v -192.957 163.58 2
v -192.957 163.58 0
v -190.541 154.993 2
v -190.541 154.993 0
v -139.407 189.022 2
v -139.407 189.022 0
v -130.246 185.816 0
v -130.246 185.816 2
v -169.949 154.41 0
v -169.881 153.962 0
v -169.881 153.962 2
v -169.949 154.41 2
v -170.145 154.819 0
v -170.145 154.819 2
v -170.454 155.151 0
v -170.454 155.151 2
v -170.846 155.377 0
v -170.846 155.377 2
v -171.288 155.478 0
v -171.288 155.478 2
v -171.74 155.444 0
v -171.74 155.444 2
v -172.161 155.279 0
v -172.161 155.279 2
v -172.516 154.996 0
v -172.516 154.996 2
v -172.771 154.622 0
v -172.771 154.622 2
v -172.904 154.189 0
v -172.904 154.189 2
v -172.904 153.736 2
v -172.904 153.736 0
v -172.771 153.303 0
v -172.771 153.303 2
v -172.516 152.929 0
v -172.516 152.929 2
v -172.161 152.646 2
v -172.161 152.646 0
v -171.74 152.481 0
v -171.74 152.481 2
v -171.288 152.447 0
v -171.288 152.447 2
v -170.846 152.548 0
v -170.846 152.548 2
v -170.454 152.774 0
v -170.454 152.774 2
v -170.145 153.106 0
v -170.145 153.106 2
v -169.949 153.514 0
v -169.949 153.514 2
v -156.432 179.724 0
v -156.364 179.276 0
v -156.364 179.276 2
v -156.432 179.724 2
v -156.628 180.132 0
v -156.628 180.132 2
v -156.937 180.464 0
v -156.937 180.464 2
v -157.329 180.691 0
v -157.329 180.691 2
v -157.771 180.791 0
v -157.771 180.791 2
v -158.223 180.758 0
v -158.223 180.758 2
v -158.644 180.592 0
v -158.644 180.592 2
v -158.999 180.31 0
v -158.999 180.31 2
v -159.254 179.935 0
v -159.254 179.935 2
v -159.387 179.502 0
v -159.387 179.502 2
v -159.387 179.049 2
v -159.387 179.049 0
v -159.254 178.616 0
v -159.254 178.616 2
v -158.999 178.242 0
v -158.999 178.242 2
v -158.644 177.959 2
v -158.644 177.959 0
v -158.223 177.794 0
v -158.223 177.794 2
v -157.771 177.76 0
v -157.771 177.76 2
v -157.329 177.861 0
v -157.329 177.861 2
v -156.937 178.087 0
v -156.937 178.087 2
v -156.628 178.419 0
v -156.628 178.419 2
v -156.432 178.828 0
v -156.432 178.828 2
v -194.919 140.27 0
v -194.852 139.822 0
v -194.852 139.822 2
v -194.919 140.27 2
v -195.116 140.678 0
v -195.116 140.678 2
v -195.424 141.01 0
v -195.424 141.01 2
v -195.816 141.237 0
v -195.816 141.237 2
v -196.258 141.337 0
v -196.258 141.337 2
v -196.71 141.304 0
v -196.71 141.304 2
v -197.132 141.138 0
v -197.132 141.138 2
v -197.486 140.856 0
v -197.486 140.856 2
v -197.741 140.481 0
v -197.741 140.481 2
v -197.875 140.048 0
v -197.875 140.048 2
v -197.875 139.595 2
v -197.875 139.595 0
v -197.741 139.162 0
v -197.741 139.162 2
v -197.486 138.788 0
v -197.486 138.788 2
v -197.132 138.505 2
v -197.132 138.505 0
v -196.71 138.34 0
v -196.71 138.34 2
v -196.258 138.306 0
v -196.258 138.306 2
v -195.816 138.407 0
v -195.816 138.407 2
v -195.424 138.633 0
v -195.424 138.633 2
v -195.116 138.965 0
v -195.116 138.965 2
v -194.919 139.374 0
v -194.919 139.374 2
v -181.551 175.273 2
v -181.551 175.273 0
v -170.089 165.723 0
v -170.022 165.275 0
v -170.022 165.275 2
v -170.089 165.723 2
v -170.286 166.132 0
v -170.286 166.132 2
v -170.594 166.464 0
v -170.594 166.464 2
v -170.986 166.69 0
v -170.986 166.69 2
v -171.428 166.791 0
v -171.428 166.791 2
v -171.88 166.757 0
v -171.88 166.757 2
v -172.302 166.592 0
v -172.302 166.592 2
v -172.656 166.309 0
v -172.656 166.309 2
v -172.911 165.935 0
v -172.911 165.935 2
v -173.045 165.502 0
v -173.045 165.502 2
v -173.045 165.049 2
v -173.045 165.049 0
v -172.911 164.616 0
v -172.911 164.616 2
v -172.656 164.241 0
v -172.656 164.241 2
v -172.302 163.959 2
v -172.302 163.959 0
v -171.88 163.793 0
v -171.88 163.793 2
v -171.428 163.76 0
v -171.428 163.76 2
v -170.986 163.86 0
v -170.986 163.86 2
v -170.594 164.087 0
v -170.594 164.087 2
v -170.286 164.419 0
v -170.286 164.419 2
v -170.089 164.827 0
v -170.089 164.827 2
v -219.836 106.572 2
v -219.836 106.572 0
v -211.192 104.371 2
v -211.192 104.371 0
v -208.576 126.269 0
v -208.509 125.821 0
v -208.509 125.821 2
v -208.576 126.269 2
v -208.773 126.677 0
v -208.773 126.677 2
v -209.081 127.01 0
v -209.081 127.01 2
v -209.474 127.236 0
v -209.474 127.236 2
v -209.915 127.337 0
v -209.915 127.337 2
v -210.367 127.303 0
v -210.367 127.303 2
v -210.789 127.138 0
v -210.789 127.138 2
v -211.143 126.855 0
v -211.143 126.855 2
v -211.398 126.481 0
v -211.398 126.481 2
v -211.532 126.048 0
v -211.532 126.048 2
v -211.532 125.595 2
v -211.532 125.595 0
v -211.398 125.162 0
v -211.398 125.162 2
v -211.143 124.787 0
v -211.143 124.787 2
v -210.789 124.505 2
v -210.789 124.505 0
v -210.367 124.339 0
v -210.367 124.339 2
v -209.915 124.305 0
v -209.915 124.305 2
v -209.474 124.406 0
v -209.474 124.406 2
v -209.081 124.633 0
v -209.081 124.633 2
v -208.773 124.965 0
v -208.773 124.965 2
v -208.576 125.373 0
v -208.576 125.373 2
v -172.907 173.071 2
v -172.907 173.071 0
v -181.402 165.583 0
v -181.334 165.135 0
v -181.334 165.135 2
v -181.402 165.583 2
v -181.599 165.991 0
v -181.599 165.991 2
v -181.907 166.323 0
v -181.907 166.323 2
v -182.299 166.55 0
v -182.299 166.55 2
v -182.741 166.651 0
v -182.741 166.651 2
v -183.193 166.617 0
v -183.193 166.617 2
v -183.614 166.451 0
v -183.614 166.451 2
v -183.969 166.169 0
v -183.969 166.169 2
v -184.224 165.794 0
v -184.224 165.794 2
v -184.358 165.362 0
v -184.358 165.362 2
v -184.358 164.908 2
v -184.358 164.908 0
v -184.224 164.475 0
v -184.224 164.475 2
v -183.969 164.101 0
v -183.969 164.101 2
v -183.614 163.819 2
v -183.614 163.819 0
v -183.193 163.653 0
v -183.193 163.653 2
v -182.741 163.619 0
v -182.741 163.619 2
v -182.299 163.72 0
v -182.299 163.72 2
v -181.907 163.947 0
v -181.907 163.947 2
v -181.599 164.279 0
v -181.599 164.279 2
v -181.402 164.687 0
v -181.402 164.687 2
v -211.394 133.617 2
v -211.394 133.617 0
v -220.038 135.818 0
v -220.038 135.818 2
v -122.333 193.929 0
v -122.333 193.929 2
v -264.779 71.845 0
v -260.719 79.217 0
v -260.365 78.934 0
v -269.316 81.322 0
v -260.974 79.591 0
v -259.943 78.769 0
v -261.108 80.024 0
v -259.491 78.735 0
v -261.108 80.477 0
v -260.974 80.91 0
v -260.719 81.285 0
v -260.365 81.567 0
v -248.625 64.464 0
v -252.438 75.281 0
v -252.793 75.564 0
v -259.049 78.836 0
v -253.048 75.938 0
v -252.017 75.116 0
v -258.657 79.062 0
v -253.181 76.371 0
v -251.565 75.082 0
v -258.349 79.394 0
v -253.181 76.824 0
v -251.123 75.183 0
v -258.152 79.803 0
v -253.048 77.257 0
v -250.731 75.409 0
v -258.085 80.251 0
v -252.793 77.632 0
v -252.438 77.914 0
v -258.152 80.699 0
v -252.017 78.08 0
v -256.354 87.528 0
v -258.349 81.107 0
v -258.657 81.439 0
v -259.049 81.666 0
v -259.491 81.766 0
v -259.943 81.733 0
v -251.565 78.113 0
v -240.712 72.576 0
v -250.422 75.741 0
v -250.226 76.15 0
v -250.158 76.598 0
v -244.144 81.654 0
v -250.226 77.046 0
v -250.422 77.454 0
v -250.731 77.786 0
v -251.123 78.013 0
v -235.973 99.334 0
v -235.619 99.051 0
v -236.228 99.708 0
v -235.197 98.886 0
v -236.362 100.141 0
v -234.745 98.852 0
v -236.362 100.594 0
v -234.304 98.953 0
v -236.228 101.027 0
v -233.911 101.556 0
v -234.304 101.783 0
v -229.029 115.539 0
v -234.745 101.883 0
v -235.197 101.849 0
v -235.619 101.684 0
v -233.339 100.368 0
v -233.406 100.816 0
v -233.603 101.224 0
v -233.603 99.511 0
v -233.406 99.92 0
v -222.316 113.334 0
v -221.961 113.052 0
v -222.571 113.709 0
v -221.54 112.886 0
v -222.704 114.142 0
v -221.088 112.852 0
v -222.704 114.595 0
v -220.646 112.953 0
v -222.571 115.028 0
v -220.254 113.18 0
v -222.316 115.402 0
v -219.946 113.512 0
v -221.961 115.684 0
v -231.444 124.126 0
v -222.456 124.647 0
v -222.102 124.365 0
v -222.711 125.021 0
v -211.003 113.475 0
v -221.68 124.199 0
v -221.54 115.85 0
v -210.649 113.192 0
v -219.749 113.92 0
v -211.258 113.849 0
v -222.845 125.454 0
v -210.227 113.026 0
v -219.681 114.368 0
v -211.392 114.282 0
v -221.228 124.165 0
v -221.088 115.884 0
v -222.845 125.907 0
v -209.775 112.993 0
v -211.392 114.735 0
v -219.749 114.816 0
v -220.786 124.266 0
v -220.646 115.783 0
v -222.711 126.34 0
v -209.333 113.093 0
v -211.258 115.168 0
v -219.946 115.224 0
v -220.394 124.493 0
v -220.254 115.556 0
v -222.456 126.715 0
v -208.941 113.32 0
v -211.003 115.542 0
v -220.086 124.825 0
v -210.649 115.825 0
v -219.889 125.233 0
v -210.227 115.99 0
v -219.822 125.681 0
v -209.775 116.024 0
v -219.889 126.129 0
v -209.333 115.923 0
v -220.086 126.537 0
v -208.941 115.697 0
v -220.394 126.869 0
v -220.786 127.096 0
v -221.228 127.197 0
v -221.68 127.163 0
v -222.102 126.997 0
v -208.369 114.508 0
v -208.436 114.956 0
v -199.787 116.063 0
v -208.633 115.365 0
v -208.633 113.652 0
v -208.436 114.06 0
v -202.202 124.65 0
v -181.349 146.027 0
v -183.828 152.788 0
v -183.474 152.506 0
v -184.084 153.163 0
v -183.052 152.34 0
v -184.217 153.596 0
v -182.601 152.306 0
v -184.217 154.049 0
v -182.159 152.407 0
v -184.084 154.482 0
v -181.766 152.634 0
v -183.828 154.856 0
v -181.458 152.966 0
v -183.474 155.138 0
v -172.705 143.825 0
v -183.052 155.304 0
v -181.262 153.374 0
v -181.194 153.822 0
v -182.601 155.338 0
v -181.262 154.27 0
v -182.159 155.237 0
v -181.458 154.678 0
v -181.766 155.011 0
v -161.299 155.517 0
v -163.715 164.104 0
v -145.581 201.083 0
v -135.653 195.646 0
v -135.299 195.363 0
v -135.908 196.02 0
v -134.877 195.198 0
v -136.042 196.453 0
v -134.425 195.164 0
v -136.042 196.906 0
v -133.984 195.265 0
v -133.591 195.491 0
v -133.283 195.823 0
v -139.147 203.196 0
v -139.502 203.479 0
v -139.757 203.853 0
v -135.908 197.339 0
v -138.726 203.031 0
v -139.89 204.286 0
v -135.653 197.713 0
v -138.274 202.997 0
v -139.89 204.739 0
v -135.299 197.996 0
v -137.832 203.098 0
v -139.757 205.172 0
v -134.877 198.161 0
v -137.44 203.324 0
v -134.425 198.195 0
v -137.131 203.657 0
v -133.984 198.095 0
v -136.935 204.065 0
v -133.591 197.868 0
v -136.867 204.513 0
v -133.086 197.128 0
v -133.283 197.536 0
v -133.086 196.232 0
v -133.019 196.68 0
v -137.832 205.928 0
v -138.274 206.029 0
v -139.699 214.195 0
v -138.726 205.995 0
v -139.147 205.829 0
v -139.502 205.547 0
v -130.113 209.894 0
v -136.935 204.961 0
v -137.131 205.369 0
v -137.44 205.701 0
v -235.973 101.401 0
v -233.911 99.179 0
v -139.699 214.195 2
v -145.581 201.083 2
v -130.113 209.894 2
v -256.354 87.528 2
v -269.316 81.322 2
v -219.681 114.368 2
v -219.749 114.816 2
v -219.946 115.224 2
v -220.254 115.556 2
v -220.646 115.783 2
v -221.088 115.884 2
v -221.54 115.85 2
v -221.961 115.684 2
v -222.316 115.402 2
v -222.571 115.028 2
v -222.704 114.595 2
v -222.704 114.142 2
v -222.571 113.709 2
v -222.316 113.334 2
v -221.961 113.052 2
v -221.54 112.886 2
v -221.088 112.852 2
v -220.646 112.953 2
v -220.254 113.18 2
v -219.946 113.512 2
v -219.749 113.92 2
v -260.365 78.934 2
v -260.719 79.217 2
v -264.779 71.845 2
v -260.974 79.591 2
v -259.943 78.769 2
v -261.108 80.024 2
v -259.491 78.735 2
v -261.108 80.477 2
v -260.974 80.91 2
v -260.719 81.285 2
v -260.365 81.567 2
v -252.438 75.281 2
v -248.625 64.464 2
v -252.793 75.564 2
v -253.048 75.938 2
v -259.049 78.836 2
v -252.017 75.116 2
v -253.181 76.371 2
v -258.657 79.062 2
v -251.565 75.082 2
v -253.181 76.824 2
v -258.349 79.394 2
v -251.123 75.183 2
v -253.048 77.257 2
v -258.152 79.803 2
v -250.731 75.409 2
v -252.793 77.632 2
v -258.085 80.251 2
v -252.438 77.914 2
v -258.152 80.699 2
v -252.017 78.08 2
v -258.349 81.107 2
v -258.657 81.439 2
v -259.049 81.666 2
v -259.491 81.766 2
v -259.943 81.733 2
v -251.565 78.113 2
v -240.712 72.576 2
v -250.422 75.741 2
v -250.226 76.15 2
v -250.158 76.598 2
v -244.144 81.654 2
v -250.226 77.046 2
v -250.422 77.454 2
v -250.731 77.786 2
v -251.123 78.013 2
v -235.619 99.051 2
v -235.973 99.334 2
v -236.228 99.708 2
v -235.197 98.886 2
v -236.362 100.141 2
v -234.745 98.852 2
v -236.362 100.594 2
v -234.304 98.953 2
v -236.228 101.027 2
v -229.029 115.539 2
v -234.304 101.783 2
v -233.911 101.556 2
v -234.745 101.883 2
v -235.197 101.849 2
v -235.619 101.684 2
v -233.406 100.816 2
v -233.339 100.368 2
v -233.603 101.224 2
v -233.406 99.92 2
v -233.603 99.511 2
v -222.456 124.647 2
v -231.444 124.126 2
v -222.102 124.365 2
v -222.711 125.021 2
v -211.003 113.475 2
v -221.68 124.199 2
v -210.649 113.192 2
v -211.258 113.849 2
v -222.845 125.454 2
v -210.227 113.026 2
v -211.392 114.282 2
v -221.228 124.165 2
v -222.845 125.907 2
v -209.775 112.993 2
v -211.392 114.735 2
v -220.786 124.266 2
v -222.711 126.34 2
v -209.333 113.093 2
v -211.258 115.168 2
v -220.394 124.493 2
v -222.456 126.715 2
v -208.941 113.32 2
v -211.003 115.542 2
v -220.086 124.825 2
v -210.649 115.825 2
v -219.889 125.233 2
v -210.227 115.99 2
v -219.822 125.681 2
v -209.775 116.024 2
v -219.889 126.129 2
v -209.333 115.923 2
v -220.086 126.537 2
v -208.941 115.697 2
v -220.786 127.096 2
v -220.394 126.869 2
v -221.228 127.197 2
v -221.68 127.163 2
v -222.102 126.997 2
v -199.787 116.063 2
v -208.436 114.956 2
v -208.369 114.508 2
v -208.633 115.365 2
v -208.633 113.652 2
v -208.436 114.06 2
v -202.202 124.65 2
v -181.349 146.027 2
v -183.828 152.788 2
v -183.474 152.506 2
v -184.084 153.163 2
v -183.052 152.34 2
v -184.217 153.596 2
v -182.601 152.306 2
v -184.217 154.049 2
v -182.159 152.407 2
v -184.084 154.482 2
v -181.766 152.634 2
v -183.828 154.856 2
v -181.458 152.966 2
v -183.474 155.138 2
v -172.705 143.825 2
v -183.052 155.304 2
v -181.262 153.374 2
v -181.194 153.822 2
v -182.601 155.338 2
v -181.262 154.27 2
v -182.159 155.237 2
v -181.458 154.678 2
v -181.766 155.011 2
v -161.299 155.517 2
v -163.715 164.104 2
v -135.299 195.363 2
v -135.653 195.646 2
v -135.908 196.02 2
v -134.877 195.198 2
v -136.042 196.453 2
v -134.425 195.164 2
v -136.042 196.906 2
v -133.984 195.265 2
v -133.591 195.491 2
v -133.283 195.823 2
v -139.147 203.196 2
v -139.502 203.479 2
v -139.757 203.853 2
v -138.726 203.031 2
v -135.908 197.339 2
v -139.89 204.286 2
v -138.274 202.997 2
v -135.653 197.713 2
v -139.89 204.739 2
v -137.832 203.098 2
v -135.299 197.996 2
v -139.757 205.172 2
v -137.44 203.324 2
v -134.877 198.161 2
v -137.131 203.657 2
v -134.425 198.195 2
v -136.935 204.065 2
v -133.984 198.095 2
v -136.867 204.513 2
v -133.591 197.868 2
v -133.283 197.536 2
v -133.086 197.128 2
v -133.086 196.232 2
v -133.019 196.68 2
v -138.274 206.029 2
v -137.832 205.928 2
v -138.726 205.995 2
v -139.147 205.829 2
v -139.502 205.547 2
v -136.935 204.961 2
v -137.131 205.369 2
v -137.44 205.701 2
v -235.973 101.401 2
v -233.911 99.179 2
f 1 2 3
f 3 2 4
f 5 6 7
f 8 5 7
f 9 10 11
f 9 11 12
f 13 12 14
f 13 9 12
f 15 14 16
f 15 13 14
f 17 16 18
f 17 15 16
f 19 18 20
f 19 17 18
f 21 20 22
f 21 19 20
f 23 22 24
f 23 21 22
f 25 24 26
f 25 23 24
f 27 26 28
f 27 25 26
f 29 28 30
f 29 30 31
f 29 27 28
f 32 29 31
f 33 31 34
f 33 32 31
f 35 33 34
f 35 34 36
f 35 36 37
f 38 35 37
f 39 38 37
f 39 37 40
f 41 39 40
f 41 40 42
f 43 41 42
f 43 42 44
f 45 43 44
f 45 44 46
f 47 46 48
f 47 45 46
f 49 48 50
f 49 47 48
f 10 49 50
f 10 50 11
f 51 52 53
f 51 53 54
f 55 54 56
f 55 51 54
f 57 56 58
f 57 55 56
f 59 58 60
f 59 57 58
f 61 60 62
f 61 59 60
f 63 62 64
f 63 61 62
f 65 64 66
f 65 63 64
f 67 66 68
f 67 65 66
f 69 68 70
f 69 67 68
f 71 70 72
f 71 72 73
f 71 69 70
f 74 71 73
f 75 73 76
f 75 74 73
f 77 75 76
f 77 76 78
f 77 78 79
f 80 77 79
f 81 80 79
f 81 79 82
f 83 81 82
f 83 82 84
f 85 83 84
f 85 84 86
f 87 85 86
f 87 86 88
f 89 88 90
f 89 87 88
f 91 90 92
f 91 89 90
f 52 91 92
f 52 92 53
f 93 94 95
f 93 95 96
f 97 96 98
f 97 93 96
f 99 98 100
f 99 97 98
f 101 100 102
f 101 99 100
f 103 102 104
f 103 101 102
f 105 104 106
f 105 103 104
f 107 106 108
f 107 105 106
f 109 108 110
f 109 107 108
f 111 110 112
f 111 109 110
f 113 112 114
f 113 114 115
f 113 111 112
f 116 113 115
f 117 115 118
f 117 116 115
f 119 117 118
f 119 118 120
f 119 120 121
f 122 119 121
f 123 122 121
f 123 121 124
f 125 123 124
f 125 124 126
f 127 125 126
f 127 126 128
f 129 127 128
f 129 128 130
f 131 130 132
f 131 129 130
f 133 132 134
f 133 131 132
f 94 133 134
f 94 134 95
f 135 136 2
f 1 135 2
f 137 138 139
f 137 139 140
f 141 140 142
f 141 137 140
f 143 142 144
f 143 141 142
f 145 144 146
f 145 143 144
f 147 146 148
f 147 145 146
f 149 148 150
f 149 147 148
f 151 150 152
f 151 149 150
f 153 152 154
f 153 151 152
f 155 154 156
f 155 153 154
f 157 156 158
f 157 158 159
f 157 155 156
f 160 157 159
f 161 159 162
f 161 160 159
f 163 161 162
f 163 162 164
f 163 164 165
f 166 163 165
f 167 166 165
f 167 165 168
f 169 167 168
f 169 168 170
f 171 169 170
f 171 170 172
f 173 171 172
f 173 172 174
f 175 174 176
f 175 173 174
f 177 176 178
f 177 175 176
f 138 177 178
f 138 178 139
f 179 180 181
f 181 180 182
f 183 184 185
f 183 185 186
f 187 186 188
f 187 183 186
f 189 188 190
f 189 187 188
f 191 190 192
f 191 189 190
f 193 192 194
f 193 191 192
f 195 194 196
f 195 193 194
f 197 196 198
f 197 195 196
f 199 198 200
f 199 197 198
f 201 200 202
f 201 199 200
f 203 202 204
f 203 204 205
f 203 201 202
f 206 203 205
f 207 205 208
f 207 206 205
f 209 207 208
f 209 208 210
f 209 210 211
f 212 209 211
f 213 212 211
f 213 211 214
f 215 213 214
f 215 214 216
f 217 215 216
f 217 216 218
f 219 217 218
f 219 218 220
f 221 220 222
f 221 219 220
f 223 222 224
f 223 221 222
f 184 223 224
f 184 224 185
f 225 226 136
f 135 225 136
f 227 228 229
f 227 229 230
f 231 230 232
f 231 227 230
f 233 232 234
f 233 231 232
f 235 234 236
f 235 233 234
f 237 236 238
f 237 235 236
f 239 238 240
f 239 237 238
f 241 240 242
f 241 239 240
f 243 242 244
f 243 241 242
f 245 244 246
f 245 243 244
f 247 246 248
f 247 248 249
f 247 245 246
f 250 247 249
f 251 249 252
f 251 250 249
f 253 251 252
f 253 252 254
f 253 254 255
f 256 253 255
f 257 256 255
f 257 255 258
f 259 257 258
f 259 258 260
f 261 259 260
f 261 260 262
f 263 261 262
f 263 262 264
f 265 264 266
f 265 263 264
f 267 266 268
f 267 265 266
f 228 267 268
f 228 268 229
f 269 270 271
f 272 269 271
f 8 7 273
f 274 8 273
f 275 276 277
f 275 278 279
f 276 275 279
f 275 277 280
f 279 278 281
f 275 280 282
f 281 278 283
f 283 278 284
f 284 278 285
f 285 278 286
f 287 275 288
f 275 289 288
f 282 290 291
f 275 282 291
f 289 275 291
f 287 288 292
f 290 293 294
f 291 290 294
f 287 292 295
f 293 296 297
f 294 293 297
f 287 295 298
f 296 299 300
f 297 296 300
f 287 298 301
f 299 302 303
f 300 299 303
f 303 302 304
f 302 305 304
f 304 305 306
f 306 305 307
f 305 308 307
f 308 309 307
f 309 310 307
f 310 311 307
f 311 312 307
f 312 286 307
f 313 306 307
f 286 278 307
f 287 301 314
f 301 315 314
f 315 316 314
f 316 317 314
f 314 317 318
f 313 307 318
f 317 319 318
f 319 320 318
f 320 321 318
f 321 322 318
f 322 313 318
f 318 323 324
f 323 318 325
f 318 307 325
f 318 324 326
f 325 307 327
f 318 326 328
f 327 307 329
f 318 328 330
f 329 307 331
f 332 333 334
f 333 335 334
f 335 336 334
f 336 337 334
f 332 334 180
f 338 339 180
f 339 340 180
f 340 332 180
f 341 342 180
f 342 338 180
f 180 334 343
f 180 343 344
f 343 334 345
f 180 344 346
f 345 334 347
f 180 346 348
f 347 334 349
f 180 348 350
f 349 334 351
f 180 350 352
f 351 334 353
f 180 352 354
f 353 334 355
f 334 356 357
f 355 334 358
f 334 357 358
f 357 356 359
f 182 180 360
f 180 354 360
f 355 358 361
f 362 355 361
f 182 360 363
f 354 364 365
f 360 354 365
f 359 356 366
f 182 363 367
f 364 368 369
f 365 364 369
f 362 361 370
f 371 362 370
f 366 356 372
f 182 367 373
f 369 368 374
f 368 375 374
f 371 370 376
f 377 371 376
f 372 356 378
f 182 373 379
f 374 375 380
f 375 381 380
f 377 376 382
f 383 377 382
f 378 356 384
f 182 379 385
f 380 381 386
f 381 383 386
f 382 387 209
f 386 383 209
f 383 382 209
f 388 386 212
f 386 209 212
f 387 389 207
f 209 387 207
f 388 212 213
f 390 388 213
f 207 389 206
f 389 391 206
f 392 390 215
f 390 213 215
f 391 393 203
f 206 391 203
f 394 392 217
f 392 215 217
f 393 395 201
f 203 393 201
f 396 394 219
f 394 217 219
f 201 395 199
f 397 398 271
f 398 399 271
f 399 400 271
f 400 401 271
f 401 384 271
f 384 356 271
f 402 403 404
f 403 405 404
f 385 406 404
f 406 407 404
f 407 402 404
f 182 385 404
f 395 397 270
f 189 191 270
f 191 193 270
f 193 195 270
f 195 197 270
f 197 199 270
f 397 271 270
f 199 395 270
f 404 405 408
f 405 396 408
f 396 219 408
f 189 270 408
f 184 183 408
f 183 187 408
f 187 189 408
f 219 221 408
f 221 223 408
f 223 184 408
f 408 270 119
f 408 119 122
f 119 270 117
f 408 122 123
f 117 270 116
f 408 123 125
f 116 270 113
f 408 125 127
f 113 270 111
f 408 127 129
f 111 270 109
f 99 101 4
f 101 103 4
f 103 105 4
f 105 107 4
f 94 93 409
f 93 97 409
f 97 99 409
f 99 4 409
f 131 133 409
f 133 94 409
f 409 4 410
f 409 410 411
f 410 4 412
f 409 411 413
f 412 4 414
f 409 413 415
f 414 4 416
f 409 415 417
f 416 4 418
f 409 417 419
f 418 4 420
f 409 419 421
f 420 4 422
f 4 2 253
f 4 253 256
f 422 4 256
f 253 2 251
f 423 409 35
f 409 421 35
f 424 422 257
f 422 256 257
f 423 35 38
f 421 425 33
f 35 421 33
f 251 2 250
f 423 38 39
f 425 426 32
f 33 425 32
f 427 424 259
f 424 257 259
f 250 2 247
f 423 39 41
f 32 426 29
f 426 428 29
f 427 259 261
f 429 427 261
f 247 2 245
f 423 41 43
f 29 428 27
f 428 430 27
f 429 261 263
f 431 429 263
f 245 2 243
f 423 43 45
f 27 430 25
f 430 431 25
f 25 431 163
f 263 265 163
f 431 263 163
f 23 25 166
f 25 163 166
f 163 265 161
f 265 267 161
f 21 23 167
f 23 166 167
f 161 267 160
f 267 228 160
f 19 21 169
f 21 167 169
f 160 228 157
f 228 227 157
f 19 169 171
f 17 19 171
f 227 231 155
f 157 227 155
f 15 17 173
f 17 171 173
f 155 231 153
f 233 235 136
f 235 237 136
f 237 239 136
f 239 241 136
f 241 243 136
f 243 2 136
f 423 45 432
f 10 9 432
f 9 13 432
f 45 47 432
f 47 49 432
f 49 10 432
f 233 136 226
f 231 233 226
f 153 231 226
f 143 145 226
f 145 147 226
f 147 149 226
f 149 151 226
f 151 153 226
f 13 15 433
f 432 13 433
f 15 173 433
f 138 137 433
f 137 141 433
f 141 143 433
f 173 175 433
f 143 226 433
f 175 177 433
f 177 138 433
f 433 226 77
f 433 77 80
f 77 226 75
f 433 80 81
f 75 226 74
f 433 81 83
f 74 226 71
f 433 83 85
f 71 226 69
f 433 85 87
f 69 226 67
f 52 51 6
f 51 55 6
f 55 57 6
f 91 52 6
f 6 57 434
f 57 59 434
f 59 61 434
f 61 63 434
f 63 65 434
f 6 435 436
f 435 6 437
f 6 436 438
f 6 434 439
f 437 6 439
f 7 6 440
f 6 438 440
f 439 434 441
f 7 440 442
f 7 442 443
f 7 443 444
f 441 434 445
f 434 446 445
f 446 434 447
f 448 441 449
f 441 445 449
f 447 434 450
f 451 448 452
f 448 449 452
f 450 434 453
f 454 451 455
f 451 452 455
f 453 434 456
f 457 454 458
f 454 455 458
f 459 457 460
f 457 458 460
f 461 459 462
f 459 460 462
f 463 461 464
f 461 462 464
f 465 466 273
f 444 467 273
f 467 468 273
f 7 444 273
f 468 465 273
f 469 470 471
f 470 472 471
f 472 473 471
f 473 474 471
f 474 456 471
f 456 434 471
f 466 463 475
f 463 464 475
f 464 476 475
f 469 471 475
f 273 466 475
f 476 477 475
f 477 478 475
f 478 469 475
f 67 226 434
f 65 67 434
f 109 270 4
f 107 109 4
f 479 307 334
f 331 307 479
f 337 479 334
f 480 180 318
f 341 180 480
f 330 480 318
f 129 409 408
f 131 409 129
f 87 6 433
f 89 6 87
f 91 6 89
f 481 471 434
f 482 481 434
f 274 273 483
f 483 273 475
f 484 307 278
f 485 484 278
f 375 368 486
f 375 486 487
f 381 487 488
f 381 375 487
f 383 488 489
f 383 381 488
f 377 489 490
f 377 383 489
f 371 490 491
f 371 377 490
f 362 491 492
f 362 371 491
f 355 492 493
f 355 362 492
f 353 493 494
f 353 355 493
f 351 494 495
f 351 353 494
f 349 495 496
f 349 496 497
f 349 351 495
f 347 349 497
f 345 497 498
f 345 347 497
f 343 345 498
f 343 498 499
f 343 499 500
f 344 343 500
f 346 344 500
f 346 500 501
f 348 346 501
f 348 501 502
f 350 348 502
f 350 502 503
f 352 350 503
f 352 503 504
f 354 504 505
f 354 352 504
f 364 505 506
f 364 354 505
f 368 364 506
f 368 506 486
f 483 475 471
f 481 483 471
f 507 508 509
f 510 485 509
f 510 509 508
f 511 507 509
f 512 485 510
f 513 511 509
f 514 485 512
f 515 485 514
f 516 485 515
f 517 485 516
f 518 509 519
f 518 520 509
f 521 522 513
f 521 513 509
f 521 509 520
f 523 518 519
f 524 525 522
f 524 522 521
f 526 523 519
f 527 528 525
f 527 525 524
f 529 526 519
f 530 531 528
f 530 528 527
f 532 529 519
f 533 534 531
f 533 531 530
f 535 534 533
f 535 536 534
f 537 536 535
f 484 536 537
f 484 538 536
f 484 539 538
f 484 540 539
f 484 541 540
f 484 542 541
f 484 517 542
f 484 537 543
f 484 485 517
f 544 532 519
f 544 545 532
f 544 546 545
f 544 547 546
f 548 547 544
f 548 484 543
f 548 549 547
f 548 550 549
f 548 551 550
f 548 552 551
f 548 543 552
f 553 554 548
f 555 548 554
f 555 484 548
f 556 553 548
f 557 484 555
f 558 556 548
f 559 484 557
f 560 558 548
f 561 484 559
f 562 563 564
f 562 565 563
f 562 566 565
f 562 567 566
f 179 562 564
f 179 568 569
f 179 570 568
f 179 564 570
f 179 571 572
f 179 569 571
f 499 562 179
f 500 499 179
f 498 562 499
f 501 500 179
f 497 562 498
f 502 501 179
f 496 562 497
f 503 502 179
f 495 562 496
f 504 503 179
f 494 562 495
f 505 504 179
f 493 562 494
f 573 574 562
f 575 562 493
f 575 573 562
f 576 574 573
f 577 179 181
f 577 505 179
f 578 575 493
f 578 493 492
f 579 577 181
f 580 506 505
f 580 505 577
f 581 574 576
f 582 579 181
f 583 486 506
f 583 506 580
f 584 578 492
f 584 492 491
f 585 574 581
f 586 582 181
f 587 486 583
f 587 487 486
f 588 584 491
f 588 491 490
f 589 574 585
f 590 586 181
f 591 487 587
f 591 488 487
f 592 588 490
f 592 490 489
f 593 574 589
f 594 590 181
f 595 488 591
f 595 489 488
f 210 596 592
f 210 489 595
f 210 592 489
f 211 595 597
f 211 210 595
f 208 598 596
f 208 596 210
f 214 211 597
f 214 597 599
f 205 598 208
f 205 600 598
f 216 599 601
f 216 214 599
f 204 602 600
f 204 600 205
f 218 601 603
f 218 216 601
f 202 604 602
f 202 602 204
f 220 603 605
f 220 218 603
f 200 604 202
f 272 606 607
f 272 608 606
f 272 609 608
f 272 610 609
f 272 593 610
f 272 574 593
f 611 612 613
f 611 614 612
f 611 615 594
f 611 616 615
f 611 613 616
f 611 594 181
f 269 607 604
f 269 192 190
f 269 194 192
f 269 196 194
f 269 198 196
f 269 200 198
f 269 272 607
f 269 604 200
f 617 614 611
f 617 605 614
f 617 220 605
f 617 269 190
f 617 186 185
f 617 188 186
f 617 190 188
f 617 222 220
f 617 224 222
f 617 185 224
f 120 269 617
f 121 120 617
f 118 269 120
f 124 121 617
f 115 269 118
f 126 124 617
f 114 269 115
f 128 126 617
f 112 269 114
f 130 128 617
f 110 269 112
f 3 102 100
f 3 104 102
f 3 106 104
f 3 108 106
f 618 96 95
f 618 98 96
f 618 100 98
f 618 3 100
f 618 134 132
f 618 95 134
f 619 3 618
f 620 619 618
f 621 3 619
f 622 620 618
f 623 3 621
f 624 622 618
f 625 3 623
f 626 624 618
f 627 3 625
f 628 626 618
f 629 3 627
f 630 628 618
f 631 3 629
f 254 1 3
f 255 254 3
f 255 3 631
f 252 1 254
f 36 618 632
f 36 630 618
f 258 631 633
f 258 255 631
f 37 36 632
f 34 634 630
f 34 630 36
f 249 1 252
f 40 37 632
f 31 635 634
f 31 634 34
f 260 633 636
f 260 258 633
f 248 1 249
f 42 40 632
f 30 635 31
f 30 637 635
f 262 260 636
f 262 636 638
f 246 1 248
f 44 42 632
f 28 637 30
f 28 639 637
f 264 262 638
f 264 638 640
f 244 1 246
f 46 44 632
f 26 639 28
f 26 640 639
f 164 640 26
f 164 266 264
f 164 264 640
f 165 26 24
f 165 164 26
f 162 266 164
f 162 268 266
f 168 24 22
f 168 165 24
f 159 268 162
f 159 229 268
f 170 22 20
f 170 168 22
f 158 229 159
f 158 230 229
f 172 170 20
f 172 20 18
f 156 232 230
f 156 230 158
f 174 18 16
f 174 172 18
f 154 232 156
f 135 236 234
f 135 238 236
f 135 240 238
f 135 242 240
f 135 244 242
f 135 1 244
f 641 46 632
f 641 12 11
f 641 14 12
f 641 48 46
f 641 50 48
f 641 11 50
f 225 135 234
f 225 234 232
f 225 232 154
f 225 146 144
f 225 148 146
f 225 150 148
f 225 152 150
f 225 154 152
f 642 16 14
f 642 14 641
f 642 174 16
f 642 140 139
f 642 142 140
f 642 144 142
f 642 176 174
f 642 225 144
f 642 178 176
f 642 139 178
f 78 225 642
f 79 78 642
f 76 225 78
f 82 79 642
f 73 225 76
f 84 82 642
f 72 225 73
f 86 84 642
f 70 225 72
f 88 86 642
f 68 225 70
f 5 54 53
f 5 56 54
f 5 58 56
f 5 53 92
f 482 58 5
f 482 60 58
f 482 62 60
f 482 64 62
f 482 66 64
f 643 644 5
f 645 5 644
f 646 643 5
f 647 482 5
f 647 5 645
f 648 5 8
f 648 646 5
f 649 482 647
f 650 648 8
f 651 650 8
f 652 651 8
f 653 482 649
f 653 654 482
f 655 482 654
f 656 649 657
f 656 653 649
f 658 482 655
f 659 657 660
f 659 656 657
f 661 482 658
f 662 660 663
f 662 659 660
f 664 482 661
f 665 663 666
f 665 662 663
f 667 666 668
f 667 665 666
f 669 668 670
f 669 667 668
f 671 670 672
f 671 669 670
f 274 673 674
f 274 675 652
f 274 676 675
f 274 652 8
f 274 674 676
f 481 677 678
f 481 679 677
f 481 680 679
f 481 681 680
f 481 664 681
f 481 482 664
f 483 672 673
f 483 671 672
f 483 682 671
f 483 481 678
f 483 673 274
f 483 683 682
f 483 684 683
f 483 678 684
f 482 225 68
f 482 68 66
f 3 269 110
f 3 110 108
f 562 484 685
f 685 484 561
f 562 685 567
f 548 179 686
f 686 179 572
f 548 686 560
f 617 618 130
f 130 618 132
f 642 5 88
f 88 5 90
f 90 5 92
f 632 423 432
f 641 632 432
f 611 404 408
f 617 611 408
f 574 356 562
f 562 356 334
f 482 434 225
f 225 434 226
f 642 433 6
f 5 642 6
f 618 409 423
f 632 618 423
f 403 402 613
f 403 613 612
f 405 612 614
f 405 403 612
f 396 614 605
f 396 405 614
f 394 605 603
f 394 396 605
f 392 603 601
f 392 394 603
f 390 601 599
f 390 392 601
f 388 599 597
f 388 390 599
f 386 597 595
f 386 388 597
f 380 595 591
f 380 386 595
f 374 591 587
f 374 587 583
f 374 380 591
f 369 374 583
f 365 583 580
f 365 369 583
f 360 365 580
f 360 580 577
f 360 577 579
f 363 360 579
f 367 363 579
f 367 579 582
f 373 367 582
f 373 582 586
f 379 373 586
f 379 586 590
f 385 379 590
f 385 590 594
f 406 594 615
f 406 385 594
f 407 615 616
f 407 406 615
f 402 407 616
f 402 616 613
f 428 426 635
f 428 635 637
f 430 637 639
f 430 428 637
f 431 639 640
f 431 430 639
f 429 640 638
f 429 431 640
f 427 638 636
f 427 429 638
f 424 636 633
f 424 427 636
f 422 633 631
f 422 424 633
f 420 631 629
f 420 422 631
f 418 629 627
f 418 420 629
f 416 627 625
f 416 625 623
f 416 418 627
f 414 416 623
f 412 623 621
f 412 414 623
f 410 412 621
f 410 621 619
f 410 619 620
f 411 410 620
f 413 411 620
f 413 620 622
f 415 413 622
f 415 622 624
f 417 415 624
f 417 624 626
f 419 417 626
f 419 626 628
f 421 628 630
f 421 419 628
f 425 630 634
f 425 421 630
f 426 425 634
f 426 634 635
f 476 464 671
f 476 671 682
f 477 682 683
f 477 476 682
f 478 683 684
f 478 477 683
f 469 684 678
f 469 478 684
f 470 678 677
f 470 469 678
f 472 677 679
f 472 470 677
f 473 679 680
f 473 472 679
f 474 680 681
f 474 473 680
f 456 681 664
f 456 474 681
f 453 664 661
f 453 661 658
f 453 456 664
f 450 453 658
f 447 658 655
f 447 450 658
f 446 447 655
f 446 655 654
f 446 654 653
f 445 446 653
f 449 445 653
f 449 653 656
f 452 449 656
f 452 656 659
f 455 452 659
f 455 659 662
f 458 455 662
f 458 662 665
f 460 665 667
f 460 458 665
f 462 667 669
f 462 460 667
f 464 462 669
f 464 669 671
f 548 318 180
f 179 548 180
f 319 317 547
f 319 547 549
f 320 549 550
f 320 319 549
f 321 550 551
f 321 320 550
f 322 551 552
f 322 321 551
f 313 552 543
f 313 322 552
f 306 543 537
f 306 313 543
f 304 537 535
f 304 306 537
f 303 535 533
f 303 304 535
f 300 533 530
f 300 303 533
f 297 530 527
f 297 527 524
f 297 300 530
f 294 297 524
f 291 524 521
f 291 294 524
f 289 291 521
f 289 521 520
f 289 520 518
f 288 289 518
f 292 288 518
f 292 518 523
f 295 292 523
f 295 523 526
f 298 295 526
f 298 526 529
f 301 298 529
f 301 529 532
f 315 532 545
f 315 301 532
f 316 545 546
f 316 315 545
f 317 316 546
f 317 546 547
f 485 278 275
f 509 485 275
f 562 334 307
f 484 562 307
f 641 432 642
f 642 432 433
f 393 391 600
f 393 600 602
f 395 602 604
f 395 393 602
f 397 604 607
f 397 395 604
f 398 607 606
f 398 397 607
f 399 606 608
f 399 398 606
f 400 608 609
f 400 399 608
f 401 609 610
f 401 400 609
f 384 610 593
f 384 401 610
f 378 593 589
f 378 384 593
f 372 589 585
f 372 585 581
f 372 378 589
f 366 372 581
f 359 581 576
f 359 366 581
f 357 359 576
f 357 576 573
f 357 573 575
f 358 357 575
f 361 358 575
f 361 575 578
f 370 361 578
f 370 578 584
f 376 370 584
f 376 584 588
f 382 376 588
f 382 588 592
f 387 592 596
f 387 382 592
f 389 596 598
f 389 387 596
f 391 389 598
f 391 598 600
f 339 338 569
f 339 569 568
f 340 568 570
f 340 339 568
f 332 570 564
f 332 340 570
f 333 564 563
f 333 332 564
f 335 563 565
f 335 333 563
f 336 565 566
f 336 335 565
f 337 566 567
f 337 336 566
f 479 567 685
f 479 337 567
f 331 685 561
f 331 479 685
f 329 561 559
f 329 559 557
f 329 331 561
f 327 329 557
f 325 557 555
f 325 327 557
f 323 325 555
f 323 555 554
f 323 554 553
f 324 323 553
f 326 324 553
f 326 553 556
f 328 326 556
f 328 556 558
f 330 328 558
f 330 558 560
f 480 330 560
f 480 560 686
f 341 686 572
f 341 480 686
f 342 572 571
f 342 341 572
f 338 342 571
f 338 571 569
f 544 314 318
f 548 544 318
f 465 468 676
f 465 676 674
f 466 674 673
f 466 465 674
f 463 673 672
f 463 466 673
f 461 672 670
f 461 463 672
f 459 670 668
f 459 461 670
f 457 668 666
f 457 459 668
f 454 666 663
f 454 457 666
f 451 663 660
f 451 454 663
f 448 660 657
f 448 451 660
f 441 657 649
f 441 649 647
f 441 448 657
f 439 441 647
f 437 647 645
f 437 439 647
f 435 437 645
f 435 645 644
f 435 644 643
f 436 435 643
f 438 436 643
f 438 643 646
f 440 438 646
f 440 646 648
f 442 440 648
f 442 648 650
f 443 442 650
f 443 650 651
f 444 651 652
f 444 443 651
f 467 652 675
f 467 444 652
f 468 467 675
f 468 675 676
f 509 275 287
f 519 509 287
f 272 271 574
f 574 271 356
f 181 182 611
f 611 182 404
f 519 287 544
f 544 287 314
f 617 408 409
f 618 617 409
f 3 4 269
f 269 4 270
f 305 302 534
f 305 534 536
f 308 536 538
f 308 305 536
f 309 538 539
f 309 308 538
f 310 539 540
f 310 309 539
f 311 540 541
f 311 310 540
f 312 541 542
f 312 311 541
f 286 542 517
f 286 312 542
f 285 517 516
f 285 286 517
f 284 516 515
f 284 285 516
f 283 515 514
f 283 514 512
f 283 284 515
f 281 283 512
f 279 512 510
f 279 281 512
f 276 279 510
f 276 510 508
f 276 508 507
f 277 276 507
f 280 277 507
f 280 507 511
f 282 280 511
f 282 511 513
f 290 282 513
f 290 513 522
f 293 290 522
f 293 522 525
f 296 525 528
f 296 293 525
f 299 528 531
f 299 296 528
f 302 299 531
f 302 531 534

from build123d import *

# Parameters (mm, degrees)
SKETCH_1_R      = 1.52
EXTRUDE_1_DEPTH = 2


with BuildPart() as part:
    # 草图1 → 凸台-拉伸1 (new body)
    with BuildSketch(Plane.XY):
        Polygon((-122.332772904, 193.928670444), (-130.112569709, 209.893801205), (-139.698830821, 214.194588314), (-145.581311392, 201.082803585), (-172.906818534, 173.07089056), (-181.550834018, 175.272509679), (-192.956593094, 163.580242467), (-190.541243439, 154.993495907), (-211.394103482, 133.616820304), (-220.038118966, 135.818439423), (-231.443878041, 124.126172211), (-229.028528386, 115.539425652), (-256.354035527, 87.527512628), (-269.315875894, 81.321614566), (-264.778632454, 71.844980469), (-248.625442054, 64.46357962), (-240.711857184, 72.575950598), (-244.144105033, 81.654022148), (-219.836292658, 106.572437113), (-211.192277174, 104.370817994), (-199.786518099, 116.063085206), (-202.201867754, 124.649831766), (-181.34900771, 146.026507369), (-172.704992227, 143.82488825), (-161.299233151, 155.517155462), (-163.714582806, 164.103902021), (-139.406770431, 189.022316987), (-130.246357773, 185.816299466), align=None)
        with Locations((-259.604526823, 80.250654079)):
            Circle(SKETCH_1_R, mode=Mode.SUBTRACT)
        with Locations((-251.678290532, 76.597666862)):
            Circle(SKETCH_1_R, mode=Mode.SUBTRACT)
        with Locations((-234.858840543, 100.367593581)):
            Circle(SKETCH_1_R, mode=Mode.SUBTRACT)
        with Locations((-221.201454913, 114.368047313)):
            Circle(SKETCH_1_R, mode=Mode.SUBTRACT)
        with Locations((-221.341779466, 125.680885552)):
            Circle(SKETCH_1_R, mode=Mode.SUBTRACT)
        with Locations((-210.028941227, 125.821210105)):
            Circle(SKETCH_1_R, mode=Mode.SUBTRACT)
        with Locations((-196.371555596, 139.821663837)):
            Circle(SKETCH_1_R, mode=Mode.SUBTRACT)
        with Locations((-182.714169966, 153.822117568)):
            Circle(SKETCH_1_R, mode=Mode.SUBTRACT)
        with Locations((-171.401331727, 153.962442121)):
            Circle(SKETCH_1_R, mode=Mode.SUBTRACT)
        with Locations((-182.854494518, 165.134955807)):
            Circle(SKETCH_1_R, mode=Mode.SUBTRACT)
        with Locations((-171.541656279, 165.27528036)):
            Circle(SKETCH_1_R, mode=Mode.SUBTRACT)
        with Locations((-157.884270649, 179.275734092)):
            Circle(SKETCH_1_R, mode=Mode.SUBTRACT)
        with Locations((-134.538850305, 196.679603292)):
            Circle(SKETCH_1_R, mode=Mode.SUBTRACT)
        with Locations((-138.387317573, 204.512791471)):
            Circle(SKETCH_1_R, mode=Mode.SUBTRACT)
        with Locations((-209.888616674, 114.508371866)):
            Circle(SKETCH_1_R, mode=Mode.SUBTRACT)
    extrude(amount=EXTRUDE_1_DEPTH)


solid = part.part
